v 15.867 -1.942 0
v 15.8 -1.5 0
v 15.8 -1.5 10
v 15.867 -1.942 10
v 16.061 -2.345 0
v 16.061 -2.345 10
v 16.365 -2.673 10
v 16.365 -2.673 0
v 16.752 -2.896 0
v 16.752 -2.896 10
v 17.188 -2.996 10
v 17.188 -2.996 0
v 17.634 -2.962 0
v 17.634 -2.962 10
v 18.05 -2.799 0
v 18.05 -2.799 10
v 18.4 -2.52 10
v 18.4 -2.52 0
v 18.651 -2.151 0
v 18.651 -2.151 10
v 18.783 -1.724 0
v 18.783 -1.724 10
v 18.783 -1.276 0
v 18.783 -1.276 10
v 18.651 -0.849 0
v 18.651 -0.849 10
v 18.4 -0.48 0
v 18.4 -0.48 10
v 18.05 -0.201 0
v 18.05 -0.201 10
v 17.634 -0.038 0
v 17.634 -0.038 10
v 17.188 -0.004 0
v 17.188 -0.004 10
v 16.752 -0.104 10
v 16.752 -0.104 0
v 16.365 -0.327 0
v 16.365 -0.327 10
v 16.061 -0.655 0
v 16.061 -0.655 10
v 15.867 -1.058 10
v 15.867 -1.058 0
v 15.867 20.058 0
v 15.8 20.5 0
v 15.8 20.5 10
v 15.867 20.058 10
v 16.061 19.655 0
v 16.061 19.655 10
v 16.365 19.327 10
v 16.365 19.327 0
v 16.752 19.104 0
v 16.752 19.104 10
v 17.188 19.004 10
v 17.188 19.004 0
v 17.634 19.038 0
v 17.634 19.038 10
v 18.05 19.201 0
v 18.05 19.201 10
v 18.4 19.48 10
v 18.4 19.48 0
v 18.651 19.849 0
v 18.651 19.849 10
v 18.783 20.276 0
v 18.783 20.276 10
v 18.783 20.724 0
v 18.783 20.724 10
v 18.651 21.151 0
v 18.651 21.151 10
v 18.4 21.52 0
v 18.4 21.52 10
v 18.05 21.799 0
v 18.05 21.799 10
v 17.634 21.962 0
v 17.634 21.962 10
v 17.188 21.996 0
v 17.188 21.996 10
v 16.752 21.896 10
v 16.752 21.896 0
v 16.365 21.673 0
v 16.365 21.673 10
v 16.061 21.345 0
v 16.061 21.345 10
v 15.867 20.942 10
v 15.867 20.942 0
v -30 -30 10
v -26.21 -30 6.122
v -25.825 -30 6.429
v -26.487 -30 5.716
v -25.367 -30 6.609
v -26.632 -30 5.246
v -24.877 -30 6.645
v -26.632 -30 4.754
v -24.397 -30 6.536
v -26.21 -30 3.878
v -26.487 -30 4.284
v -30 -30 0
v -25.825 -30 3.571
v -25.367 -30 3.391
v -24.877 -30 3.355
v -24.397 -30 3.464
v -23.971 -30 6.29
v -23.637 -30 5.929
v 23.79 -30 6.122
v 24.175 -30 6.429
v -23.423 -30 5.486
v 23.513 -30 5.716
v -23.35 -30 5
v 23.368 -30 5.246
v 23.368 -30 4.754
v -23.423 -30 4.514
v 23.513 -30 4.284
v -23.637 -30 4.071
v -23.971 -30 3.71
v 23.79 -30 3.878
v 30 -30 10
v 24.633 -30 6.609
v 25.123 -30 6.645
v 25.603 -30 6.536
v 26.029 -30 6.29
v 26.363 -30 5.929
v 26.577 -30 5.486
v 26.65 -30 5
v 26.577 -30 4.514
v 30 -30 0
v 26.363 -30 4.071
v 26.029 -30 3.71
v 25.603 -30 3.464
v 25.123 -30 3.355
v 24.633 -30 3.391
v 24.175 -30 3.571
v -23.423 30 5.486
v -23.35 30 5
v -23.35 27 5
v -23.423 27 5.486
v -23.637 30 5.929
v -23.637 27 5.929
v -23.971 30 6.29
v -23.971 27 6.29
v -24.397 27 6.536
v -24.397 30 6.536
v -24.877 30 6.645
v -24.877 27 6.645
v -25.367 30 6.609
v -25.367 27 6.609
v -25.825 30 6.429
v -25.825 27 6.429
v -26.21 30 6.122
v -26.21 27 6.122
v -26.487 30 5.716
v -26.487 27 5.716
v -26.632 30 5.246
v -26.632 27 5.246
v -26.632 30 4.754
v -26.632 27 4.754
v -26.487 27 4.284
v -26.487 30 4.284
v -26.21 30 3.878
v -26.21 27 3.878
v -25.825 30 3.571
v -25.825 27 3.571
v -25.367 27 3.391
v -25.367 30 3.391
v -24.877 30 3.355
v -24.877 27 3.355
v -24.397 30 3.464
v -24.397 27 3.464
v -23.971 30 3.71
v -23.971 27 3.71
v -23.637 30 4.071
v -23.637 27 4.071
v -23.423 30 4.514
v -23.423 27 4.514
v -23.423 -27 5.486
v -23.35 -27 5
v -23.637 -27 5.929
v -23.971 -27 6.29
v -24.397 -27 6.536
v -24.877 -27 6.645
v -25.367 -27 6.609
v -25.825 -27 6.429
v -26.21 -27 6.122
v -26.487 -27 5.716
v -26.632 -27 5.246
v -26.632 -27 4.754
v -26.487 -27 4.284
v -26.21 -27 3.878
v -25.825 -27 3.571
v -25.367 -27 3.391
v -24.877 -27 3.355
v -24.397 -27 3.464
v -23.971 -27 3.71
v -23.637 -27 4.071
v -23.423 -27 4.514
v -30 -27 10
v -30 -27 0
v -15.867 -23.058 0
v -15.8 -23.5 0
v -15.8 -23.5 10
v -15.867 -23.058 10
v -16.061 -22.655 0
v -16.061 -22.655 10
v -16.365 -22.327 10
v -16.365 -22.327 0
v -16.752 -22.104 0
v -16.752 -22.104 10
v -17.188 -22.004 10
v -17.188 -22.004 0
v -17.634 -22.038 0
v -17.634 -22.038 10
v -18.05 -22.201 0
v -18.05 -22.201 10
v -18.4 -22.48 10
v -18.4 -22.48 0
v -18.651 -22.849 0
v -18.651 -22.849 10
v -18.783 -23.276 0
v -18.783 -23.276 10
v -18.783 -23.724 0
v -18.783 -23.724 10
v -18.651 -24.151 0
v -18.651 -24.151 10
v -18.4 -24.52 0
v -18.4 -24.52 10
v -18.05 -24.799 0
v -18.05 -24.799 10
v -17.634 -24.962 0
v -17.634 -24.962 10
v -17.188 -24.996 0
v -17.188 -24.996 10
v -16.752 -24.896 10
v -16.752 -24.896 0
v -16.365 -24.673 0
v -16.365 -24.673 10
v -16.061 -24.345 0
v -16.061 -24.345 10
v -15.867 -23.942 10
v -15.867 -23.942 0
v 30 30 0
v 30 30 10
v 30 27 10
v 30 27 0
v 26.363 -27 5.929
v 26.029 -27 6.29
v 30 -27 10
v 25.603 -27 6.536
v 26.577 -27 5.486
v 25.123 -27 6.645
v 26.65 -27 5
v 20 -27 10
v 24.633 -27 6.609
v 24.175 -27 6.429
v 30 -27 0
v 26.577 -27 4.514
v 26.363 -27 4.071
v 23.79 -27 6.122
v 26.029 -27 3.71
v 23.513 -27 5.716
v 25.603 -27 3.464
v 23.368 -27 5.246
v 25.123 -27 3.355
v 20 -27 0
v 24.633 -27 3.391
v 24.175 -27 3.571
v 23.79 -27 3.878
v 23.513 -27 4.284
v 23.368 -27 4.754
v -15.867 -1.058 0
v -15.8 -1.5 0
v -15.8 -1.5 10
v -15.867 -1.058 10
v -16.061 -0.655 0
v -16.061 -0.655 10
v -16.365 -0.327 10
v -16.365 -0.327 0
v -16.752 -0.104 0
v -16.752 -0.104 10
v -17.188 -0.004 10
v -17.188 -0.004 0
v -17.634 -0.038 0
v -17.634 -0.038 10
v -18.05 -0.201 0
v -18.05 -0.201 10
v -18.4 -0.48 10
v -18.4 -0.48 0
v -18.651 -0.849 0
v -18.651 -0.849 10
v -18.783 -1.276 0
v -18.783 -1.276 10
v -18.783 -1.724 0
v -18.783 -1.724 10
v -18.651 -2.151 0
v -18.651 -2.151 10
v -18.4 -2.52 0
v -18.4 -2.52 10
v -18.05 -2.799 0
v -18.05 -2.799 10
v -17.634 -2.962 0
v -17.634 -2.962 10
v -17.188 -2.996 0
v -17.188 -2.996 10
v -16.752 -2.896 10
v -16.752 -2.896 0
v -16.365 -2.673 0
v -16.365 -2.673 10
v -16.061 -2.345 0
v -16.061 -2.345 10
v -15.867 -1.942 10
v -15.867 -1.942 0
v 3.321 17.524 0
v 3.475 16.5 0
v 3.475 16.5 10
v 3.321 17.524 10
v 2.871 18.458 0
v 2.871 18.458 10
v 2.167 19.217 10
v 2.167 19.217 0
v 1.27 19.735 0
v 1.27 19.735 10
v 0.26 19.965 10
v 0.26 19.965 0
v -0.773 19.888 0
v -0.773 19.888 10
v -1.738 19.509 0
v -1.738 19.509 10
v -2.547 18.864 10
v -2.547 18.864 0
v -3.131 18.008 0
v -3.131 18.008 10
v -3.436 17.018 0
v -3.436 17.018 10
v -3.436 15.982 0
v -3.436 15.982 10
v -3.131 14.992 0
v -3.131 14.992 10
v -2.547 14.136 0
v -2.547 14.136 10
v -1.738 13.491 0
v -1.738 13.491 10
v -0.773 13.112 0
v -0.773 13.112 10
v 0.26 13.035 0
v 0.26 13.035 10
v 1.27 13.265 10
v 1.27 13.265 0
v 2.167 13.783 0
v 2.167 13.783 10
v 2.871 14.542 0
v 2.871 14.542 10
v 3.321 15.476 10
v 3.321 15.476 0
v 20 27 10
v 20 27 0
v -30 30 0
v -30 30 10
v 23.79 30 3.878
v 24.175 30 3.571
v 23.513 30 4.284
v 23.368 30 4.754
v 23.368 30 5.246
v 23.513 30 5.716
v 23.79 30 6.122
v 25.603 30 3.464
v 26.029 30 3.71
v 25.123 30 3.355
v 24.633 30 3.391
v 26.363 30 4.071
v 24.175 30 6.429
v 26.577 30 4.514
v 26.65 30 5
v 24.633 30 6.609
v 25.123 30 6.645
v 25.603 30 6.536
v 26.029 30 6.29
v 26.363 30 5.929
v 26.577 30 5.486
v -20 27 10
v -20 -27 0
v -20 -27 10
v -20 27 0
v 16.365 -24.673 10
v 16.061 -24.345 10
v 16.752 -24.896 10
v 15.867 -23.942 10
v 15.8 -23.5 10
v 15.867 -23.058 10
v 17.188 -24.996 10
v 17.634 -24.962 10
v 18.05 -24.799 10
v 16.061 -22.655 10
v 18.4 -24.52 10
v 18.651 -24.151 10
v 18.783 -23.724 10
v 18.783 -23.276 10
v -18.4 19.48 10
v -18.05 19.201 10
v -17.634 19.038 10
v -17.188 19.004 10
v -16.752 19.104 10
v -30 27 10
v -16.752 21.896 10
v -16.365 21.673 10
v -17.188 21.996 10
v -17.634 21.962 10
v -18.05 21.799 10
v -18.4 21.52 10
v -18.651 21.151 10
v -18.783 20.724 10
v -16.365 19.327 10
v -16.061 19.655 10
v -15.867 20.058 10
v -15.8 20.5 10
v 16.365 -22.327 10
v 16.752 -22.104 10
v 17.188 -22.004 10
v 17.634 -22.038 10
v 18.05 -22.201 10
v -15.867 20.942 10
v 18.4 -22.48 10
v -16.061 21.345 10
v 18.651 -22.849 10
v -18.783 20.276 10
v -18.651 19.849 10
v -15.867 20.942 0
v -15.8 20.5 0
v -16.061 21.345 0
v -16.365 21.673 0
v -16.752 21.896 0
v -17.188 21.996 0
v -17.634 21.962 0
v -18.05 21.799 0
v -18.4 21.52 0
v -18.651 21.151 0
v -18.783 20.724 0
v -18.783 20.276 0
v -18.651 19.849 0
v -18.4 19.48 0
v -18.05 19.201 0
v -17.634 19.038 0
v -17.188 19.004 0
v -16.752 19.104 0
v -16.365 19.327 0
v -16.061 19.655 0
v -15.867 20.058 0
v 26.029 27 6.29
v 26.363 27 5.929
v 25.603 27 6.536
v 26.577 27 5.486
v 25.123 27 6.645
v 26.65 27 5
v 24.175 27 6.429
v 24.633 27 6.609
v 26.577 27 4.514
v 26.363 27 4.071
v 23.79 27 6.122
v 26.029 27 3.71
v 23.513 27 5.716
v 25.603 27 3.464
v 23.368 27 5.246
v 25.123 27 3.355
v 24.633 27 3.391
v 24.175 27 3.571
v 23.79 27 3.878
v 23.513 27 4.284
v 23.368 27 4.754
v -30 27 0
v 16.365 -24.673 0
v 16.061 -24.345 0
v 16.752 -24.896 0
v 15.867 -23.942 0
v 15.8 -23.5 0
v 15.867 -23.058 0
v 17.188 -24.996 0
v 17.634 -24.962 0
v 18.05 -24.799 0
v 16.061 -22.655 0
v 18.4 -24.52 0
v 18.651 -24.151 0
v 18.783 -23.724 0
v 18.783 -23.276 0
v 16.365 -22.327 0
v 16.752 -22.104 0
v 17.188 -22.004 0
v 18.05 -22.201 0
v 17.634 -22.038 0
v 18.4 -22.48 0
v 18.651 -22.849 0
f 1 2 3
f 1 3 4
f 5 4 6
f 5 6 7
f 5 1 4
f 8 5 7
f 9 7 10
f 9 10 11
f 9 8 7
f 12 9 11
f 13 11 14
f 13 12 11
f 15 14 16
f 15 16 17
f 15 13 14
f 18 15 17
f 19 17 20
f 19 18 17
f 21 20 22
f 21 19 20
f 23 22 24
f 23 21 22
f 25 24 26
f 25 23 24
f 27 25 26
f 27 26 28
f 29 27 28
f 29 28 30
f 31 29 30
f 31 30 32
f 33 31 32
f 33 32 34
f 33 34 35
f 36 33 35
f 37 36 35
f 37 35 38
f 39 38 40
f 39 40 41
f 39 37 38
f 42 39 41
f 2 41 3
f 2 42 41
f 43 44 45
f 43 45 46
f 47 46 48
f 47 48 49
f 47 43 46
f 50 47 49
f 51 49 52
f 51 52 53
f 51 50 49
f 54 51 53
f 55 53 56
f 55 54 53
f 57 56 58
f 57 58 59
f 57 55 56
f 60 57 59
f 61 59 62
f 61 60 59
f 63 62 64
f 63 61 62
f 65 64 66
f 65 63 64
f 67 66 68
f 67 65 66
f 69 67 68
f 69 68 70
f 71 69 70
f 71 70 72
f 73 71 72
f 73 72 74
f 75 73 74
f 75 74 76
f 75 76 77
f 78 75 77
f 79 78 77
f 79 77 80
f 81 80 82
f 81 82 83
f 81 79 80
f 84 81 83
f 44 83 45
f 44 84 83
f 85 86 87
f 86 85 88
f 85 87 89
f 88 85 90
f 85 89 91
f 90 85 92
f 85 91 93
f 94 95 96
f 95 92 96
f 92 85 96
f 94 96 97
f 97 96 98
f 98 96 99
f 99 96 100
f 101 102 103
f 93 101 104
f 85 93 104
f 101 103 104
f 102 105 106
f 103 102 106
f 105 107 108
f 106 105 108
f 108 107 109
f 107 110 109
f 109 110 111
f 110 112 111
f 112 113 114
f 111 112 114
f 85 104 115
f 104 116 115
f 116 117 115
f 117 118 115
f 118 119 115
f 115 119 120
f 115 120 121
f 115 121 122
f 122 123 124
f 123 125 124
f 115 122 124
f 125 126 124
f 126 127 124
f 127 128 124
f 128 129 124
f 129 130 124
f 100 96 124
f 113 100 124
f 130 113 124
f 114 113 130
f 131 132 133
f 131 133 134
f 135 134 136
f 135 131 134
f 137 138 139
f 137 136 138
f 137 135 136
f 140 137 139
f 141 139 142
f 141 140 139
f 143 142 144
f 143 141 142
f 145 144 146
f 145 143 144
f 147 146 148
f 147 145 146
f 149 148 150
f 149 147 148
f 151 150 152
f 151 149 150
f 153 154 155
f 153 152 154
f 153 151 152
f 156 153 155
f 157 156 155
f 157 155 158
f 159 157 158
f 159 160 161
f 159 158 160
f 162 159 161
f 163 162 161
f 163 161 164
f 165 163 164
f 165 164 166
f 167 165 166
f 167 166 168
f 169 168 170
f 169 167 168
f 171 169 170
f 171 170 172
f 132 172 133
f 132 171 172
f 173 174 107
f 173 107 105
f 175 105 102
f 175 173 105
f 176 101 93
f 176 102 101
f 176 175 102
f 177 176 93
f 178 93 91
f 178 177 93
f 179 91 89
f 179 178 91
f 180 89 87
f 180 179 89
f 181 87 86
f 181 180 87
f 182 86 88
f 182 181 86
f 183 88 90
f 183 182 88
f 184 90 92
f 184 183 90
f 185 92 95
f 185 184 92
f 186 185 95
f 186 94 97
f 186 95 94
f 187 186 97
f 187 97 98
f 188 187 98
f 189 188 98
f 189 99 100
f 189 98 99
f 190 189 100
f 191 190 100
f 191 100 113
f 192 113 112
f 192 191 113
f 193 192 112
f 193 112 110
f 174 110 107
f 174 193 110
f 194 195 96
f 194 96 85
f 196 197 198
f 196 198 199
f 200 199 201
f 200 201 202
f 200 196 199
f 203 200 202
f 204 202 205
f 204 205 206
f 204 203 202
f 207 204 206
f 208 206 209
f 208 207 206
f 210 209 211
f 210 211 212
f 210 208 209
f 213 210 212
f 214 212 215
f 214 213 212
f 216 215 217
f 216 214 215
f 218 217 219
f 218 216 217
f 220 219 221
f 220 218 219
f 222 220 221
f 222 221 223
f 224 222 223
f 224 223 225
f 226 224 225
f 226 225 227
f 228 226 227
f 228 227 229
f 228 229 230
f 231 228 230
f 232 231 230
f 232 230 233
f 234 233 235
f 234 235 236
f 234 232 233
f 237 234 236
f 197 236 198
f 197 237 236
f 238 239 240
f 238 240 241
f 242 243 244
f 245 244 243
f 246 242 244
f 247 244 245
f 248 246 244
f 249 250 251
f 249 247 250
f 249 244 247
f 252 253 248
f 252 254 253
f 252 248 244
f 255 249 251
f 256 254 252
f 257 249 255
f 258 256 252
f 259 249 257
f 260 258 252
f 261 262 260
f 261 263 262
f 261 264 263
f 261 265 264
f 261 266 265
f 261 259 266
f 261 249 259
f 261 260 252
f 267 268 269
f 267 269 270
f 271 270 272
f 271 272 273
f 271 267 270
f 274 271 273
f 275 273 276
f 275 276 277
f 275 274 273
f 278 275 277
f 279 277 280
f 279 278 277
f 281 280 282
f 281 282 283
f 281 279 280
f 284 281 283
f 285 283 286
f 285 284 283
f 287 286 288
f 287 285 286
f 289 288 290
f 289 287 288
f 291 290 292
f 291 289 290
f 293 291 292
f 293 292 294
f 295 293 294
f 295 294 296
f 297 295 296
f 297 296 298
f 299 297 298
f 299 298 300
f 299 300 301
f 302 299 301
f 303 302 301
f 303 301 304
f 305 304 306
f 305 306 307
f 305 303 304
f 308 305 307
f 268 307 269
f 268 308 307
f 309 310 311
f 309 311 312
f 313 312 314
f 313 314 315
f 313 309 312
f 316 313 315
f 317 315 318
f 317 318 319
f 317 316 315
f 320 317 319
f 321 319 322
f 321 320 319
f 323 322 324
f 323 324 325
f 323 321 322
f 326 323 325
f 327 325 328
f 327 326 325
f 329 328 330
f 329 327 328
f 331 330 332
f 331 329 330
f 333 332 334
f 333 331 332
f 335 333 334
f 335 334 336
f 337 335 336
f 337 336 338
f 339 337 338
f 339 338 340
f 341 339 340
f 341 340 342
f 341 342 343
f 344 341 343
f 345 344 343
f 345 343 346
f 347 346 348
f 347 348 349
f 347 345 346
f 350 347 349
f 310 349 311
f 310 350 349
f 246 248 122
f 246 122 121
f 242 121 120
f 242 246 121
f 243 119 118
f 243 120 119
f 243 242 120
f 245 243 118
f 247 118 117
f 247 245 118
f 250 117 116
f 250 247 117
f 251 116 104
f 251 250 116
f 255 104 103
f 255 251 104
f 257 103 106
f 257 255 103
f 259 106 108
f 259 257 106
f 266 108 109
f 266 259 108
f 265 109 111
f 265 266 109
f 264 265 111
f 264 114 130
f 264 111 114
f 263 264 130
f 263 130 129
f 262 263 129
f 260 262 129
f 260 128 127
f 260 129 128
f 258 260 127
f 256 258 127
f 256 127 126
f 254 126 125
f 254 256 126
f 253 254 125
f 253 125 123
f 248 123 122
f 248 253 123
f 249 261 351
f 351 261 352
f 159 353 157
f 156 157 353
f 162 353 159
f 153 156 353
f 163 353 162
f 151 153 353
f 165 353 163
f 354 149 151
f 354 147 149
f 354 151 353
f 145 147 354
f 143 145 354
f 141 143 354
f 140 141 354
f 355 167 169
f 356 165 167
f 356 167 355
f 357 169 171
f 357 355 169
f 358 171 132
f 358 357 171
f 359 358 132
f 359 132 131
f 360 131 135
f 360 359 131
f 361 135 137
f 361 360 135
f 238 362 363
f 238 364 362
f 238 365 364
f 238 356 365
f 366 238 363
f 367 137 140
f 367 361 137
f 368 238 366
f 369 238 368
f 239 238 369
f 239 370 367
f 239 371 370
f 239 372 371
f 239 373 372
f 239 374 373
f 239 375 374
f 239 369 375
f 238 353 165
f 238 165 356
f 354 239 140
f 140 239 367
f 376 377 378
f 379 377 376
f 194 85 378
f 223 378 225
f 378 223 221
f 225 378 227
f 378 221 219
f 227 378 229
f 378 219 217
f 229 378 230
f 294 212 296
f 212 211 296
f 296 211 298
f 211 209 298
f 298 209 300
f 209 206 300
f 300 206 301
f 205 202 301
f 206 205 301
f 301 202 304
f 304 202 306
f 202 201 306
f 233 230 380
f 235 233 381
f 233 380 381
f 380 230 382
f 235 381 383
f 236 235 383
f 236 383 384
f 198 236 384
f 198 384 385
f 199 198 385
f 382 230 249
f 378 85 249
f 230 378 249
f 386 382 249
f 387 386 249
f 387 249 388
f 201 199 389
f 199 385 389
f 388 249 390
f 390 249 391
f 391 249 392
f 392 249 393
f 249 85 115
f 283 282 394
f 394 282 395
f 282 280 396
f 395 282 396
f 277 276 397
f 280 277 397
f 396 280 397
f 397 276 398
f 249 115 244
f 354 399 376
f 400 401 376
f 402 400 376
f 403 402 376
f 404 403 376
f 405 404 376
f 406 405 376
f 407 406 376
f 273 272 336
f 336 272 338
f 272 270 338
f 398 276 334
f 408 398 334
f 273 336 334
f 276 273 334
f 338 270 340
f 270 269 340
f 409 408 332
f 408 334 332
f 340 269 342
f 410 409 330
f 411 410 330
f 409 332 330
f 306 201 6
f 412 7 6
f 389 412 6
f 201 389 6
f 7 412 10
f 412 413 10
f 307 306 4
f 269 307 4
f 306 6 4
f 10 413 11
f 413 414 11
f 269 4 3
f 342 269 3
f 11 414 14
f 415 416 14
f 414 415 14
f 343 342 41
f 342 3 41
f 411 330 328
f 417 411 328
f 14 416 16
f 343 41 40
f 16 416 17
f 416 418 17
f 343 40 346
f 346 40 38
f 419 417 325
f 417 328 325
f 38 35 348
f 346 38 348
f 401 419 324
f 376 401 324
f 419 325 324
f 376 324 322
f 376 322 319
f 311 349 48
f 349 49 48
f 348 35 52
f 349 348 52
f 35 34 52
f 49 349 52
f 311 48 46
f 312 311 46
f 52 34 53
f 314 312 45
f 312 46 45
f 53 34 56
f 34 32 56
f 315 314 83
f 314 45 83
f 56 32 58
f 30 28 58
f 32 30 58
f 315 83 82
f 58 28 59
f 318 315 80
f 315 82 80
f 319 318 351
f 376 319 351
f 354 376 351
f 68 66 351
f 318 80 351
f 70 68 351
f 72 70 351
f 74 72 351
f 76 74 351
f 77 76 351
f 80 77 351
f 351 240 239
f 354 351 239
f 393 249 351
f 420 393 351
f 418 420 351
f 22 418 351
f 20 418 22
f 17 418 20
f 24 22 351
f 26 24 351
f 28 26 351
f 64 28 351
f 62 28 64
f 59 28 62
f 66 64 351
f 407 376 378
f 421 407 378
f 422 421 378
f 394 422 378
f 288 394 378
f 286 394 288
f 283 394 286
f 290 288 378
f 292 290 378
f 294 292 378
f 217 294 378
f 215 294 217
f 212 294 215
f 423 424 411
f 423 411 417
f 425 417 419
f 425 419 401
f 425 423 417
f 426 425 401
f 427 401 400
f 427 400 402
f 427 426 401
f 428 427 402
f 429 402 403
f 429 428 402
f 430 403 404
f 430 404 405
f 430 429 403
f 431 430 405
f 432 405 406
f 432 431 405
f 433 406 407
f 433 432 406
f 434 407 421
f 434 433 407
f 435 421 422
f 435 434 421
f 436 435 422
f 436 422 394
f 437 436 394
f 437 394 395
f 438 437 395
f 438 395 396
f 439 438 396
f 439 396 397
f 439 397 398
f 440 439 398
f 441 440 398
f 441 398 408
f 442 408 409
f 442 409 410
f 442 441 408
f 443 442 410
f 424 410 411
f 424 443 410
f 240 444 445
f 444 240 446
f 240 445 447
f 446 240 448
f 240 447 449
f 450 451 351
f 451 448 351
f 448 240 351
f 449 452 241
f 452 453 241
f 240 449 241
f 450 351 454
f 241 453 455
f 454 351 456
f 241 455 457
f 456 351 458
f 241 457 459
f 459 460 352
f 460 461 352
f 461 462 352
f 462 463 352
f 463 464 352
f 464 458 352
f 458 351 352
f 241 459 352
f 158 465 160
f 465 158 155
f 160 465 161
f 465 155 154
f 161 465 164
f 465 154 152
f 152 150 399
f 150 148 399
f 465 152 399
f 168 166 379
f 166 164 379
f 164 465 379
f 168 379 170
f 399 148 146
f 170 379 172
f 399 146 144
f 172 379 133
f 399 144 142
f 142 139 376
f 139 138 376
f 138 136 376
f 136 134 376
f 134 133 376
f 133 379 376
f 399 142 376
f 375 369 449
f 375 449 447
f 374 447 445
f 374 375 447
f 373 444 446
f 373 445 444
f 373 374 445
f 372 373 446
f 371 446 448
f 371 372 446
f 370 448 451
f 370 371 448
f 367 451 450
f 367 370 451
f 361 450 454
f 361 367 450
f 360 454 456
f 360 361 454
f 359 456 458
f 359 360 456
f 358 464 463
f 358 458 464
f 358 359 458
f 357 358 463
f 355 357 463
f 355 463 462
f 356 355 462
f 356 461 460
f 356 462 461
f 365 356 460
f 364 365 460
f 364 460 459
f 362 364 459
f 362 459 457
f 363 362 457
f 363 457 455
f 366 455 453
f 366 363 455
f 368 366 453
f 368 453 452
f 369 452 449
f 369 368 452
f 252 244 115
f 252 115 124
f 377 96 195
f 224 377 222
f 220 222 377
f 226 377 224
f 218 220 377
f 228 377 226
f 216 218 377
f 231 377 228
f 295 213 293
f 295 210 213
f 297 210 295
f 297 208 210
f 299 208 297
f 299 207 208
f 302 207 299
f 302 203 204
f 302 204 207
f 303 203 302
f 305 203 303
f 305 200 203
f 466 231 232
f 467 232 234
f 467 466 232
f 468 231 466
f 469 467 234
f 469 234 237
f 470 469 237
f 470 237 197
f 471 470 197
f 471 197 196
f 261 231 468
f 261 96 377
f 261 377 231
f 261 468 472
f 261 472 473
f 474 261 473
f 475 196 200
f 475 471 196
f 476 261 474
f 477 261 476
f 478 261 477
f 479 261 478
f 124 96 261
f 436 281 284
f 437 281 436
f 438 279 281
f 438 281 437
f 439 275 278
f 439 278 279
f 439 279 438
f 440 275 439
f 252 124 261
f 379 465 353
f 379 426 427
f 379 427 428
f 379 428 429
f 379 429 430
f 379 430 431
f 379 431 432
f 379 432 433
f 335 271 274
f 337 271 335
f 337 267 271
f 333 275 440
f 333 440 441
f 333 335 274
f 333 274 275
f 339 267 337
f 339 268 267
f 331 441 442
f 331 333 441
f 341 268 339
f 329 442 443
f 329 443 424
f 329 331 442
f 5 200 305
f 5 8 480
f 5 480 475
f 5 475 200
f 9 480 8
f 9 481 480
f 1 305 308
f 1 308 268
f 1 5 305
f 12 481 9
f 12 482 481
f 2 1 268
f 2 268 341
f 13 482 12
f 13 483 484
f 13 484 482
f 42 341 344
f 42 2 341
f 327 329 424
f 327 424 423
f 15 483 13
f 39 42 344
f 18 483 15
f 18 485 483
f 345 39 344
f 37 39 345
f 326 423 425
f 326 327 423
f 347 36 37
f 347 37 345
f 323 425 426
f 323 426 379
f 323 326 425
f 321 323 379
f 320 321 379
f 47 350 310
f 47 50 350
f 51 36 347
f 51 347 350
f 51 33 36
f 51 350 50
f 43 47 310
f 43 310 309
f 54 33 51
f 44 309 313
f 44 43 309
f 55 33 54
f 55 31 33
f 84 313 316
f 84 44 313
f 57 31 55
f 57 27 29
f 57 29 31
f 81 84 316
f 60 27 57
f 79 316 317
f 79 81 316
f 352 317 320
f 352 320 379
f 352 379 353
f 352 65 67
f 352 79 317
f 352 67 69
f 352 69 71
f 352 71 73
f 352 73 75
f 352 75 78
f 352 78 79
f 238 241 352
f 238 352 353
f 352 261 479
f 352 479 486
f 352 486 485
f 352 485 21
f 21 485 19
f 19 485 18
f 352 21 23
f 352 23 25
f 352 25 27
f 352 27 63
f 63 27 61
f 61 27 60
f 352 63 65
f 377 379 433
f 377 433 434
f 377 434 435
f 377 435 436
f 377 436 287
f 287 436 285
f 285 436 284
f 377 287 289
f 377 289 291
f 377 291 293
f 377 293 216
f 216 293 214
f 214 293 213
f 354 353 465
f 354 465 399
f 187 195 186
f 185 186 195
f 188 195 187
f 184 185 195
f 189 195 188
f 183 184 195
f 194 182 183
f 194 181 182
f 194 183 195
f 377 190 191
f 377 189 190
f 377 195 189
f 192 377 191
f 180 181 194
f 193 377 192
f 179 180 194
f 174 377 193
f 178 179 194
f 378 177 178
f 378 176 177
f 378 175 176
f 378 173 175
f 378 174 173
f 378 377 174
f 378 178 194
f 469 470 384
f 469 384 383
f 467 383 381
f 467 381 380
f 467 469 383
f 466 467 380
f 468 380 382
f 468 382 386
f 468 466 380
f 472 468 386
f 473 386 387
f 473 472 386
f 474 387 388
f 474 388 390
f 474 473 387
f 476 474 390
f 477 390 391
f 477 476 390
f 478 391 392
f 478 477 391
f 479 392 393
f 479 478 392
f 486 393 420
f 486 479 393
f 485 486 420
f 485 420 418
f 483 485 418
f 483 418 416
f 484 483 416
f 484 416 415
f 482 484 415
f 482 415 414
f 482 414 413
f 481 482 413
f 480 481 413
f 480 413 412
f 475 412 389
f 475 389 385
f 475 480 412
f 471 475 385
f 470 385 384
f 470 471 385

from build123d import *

# Parameters (mm, degrees)
SKETCH1_W                    = 40
SKETCH1_H                    = 60
SKETCH1_R                    = 3.475
SKETCH1_R_2                  = 1.5
BOSS_EXTRUDE1_DEPTH          = 10
ESQUISSE1_W                  = 10
ESQUISSE1_H                  = 3
BOSS_EXTRU_1_DEPTH           = 10
ESQUISSE2_W                  = 10
ESQUISSE2_H                  = 3
BOSS_EXTRU_2_DEPTH           = 10
ENL_V_MAT_EXTRU_1_DEPTH      = 66.184353951
ENL_V_MAT_EXTRU_1_DEPTH_BACK = 66.184353951
ESQUISSE3_R                  = 1.65


with BuildPart() as part:
    # Sketch1 → Boss-Extrude1 (new body)
    with BuildSketch(Plane.XY):
        Rectangle(SKETCH1_W, SKETCH1_H)
        with Locations((0, 16.5)):
            Circle(SKETCH1_R, mode=Mode.SUBTRACT)
        with Locations((-17.3, -1.5)):
            Circle(SKETCH1_R_2, mode=Mode.SUBTRACT)
        with Locations((-17.3, 20.5)):
            Circle(SKETCH1_R_2, mode=Mode.SUBTRACT)
        with Locations(Location((17.3, -1.5, 0), (0, 0, 180))):
            Circle(SKETCH1_R_2, mode=Mode.SUBTRACT)
        with Locations(Location((17.3, 20.5, 0), (0, 0, 180))):
            Circle(SKETCH1_R_2, mode=Mode.SUBTRACT)
        with Locations((-17.3, -23.5)):
            Circle(SKETCH1_R_2, mode=Mode.SUBTRACT)
        with Locations(Location((17.3, -23.5, 0), (0, 0, 180))):
            Circle(SKETCH1_R_2, mode=Mode.SUBTRACT)
    extrude(amount=BOSS_EXTRUDE1_DEPTH)

    # Esquisse1 → Boss.-Extru.1 (add)
    with BuildSketch(Plane(origin=(20, 0, 0), x_dir=(0, 0, -1), z_dir=(1, 0, 0))):
        with Locations((-5, 28.5)):
            Rectangle(ESQUISSE1_W, ESQUISSE1_H)
        with Locations((-5, -28.5)):
            Rectangle(ESQUISSE1_W, ESQUISSE1_H)
    extrude(amount=BOSS_EXTRU_1_DEPTH)

    # Esquisse2 → Boss.-Extru.2 (add)
    with BuildSketch(Plane.ZY.offset(20)):
        with Locations((5, 28.5)):
            Rectangle(ESQUISSE2_W, ESQUISSE2_H)
        with Locations((5, -28.5)):
            Rectangle(ESQUISSE2_W, ESQUISSE2_H)
    extrude(amount=BOSS_EXTRU_2_DEPTH)

    # Esquisse3 → Enlèv. mat.-Extru.1 (cut, two sides: drawn at the far end of the back side and taken through both)
    with BuildSketch(Plane.XZ.offset(-27).offset(-ENL_V_MAT_EXTRU_1_DEPTH_BACK)):
        with Locations((-25, 5)):
            Circle(ESQUISSE3_R)
        with Locations((25, 5)):
            Circle(ESQUISSE3_R)
    extrude(amount=ENL_V_MAT_EXTRU_1_DEPTH + ENL_V_MAT_EXTRU_1_DEPTH_BACK, mode=Mode.SUBTRACT)


solid = part.part
